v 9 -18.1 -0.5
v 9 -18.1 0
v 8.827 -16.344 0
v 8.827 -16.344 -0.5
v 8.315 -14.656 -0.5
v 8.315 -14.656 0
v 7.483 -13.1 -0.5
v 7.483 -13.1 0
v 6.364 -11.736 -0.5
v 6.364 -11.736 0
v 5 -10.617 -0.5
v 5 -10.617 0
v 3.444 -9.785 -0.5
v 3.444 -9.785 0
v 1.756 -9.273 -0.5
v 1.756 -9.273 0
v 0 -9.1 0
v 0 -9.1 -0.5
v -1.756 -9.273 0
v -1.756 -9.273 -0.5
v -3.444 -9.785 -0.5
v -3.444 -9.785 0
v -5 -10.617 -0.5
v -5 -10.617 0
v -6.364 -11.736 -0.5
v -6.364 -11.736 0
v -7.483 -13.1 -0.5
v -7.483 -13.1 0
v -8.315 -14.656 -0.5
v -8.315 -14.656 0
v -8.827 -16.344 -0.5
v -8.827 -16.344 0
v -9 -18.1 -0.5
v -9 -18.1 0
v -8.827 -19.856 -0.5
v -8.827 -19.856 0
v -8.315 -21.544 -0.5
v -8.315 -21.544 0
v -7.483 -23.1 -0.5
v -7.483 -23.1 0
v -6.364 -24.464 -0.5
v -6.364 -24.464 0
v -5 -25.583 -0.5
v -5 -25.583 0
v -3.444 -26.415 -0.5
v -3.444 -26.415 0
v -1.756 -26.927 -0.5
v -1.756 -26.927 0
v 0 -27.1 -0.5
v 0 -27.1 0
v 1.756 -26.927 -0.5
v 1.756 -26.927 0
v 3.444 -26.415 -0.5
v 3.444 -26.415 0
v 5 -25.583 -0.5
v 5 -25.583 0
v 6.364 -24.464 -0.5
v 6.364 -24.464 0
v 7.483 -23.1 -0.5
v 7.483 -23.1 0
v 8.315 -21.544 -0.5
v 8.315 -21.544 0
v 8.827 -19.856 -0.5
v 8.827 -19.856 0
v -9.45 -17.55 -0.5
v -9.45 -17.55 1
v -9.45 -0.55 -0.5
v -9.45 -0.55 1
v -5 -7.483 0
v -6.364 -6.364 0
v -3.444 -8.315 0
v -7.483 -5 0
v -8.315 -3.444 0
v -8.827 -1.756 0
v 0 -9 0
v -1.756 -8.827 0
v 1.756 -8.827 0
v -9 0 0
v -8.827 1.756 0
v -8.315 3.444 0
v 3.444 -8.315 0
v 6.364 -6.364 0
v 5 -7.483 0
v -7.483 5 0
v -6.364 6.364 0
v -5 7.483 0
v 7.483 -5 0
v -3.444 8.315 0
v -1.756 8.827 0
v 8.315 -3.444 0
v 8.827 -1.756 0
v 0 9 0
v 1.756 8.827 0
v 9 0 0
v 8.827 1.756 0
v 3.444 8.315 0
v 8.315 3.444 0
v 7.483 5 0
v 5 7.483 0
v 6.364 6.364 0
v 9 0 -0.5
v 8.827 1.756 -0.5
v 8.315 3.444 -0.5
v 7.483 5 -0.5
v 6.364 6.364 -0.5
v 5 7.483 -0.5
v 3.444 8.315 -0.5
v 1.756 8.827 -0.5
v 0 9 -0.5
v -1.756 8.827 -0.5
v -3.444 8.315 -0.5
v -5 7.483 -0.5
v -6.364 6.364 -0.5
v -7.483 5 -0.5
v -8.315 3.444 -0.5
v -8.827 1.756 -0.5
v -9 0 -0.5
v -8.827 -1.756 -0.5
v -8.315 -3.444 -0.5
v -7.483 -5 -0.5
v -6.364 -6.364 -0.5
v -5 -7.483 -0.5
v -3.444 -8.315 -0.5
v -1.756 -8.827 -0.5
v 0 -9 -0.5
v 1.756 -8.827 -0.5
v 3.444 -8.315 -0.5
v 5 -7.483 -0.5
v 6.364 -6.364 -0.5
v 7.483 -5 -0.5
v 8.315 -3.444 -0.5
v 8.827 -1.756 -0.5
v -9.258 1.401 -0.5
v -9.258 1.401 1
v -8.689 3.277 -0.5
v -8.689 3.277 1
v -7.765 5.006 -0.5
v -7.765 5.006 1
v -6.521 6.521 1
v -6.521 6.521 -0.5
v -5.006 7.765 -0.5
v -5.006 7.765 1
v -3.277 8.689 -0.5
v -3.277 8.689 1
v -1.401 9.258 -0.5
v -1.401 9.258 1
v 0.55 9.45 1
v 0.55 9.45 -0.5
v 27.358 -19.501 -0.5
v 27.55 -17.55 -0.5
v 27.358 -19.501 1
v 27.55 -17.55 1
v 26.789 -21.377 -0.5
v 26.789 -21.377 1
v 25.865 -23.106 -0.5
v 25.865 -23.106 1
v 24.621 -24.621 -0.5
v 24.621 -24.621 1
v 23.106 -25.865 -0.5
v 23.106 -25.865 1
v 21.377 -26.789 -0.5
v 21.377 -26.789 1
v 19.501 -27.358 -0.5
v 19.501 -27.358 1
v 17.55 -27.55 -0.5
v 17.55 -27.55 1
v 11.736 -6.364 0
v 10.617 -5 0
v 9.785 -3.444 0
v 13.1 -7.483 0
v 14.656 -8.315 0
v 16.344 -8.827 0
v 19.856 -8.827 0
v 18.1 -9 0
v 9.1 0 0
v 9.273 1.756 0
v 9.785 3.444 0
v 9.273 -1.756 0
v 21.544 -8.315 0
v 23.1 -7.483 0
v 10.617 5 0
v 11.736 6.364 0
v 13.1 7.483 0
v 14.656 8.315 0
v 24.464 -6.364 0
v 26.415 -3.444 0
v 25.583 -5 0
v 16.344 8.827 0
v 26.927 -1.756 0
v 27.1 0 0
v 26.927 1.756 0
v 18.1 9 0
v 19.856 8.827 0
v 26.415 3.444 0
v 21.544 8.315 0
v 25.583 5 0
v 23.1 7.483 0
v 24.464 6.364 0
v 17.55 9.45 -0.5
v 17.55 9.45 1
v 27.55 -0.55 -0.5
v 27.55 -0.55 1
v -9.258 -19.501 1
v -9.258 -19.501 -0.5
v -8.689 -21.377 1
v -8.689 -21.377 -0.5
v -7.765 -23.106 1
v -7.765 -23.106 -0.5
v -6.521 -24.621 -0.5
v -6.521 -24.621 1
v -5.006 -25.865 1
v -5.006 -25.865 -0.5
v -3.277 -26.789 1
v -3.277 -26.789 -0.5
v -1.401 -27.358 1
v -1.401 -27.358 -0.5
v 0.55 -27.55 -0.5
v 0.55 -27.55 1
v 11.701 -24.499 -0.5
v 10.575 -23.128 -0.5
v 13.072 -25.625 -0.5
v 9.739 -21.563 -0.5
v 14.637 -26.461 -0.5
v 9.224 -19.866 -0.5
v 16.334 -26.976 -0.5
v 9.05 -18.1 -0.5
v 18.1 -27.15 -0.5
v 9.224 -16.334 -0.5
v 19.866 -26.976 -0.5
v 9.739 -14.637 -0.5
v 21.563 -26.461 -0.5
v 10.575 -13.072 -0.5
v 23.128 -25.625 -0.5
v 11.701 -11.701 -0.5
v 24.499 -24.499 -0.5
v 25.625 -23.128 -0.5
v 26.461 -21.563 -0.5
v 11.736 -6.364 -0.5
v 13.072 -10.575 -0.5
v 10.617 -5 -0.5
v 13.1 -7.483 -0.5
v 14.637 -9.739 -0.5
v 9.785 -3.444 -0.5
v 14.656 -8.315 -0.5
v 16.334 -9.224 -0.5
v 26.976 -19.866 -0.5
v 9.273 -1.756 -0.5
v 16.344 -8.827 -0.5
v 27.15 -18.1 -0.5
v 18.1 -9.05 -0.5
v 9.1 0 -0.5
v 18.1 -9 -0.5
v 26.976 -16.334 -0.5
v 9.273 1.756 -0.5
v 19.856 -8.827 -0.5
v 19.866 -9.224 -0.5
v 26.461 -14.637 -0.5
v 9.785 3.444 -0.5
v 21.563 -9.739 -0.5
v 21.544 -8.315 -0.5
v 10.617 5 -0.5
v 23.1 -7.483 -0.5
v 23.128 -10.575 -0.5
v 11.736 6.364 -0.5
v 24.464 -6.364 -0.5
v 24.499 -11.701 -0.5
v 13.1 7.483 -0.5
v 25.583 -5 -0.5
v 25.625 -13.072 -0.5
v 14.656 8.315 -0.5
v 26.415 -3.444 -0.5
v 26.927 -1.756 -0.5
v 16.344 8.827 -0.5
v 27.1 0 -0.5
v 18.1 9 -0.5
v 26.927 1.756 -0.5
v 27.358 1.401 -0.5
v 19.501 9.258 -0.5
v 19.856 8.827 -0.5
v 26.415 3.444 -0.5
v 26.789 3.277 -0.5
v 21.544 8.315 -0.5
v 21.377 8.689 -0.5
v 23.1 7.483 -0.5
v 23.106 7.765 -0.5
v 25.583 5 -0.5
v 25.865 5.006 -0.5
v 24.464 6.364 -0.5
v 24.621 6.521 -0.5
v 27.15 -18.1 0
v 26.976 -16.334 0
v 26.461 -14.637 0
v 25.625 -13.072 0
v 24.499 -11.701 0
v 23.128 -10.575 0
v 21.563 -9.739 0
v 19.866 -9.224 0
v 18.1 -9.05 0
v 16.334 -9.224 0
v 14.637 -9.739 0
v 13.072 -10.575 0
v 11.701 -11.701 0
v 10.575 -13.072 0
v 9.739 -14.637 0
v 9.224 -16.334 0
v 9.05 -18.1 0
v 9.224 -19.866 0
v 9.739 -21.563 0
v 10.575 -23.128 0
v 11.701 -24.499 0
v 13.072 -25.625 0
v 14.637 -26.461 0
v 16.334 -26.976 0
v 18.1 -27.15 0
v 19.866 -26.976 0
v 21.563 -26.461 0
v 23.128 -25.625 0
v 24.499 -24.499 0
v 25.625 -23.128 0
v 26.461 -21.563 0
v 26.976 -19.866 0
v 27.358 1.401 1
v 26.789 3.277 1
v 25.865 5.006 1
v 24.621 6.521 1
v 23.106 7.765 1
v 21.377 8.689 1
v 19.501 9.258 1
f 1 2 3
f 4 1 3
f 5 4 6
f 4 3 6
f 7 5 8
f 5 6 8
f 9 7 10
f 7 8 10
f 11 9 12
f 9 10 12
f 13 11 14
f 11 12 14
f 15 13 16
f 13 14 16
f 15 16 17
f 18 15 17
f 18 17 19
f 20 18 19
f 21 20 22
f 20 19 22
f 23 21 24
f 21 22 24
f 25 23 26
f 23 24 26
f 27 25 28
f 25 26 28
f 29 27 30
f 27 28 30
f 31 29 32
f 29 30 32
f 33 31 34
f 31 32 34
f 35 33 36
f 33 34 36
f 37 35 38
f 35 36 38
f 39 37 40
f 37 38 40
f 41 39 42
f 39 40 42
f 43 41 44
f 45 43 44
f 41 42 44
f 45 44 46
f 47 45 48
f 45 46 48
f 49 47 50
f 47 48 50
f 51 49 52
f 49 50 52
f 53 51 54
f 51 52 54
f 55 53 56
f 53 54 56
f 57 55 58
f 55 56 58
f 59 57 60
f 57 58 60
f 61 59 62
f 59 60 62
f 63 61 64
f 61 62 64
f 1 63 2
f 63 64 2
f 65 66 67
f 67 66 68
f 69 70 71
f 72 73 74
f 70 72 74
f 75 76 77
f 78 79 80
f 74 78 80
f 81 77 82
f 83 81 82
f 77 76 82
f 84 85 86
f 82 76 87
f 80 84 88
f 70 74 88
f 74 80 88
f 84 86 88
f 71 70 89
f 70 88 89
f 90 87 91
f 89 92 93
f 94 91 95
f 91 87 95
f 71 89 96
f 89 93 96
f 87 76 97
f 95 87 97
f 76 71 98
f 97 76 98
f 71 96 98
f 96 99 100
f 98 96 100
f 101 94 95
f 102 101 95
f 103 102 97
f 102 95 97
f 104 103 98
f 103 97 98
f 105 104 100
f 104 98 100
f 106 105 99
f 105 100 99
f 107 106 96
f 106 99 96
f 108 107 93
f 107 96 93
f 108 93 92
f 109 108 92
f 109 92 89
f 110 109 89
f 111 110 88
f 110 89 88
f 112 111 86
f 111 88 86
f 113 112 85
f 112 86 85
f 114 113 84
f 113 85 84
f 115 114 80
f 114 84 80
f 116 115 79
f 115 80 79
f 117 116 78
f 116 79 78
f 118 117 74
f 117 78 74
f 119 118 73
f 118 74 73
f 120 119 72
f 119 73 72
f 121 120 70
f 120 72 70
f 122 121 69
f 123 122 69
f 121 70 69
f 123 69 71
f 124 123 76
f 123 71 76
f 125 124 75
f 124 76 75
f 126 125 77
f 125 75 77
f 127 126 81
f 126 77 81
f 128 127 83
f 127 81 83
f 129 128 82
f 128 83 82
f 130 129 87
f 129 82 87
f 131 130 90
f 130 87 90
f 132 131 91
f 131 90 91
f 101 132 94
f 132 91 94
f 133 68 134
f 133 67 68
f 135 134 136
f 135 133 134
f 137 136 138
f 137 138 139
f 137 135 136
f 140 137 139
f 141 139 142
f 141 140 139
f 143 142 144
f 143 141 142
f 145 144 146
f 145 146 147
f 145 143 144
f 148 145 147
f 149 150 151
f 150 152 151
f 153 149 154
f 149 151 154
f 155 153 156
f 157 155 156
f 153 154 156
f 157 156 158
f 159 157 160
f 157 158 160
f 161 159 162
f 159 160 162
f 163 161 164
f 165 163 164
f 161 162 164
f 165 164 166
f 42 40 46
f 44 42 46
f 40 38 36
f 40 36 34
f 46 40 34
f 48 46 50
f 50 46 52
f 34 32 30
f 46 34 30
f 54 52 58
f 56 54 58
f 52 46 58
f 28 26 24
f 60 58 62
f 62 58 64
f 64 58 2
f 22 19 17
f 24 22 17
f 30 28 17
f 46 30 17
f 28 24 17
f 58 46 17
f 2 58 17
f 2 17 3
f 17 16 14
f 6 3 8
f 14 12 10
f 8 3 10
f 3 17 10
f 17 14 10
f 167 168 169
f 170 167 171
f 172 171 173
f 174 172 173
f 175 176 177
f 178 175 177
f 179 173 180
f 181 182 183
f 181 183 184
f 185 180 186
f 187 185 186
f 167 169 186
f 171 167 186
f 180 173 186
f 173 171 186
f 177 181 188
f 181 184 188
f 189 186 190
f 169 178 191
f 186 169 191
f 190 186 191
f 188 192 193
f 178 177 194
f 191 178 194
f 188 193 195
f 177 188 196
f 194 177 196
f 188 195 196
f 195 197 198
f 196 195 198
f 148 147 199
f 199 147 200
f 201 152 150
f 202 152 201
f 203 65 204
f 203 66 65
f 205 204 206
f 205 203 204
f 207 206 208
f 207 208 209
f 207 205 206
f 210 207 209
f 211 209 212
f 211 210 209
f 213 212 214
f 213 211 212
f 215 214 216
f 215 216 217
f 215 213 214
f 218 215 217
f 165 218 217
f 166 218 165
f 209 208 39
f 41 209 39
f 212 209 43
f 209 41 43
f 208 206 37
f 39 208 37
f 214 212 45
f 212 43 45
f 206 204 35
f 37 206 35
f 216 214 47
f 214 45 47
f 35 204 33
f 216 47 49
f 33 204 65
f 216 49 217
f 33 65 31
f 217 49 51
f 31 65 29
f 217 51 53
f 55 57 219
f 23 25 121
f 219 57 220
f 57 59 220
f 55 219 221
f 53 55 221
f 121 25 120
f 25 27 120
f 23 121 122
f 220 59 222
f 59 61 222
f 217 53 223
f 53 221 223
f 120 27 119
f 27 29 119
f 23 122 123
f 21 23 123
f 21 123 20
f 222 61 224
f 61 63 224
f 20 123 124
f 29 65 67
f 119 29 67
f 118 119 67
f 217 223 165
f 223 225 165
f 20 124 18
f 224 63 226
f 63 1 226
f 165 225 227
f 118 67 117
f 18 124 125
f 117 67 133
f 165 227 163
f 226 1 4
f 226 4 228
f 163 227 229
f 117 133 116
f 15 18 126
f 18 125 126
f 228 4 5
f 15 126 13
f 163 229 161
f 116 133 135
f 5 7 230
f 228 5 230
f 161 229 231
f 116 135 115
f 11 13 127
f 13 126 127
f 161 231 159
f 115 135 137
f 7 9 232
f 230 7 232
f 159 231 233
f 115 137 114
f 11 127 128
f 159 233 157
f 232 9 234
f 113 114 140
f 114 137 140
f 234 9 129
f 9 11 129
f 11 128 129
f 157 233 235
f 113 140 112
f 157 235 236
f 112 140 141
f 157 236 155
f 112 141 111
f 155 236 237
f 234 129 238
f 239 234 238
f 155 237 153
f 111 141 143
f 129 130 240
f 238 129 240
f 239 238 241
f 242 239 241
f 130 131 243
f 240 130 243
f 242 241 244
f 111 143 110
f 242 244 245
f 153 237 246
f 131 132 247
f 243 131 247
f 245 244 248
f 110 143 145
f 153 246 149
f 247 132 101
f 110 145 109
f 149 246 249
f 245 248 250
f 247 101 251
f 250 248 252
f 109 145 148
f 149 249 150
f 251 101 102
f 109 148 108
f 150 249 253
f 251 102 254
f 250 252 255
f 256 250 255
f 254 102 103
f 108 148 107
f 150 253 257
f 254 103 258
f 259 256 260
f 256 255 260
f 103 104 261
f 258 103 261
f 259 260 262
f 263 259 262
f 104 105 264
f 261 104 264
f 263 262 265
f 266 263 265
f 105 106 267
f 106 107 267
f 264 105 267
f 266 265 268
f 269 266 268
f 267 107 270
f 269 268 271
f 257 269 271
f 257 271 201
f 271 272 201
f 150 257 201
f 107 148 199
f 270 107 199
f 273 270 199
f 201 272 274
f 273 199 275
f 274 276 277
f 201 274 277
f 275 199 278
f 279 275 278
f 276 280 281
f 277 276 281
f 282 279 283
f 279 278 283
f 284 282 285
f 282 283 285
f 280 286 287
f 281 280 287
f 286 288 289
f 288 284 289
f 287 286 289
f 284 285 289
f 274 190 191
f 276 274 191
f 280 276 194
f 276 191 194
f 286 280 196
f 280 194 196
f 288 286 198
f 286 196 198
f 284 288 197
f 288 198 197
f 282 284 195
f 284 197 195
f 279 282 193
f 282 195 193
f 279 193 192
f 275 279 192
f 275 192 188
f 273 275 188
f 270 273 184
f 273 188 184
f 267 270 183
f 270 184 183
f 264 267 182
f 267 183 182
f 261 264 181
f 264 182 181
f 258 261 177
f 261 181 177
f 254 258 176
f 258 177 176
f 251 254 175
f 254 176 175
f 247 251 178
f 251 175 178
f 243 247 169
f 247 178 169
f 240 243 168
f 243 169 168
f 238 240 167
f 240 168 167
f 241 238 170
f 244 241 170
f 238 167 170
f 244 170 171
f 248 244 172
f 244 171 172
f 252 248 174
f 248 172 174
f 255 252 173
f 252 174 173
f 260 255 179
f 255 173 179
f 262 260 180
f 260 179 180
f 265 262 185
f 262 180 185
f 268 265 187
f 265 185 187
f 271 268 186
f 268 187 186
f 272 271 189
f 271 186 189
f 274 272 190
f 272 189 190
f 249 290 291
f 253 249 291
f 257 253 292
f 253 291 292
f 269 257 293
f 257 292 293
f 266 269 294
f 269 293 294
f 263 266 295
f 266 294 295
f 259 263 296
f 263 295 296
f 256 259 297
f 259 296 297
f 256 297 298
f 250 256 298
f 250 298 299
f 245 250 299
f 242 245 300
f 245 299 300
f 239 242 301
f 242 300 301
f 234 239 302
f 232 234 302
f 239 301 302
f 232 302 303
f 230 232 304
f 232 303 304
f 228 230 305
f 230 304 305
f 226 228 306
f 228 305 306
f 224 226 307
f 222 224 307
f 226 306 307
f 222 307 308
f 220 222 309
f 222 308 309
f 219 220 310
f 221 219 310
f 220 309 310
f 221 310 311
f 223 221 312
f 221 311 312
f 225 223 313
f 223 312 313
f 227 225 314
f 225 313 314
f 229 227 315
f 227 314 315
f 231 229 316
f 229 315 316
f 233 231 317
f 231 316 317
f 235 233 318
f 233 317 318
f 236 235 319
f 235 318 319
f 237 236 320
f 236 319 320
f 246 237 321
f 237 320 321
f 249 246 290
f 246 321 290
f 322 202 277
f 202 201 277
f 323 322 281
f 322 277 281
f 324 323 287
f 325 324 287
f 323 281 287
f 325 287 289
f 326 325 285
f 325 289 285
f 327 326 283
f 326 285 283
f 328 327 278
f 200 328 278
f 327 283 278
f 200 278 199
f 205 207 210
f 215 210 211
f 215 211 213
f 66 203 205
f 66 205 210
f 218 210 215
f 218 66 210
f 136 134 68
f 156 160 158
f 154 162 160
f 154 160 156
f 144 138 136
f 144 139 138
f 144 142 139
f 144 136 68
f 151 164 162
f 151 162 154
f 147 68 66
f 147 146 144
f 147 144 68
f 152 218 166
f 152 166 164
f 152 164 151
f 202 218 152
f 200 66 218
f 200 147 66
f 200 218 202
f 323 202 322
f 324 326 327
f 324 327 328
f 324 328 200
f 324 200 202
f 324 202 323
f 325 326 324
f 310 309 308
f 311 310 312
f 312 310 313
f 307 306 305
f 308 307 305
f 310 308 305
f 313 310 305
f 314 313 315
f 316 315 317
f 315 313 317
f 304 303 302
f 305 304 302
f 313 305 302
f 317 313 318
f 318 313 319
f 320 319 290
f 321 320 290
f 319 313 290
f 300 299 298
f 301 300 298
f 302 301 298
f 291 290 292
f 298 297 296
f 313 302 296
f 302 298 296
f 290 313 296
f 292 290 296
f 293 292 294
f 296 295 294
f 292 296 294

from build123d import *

# Parameters (mm, degrees)
SKETCH_1_W      = 37
SKETCH_1_H      = 37
EXTRUDE_1_DEPTH = 1
SKETCH_1_6_W    = 37
SKETCH_1_6_H    = 37
SKETCH_1_6_R    = 9.05
SKETCH_1_6_R_2  = 9
EXTRUDE_3_DEPTH = 0.5
FILLET_1_R      = 10


with BuildPart() as part:
    # Эскиз1 → Бобышка-Вытянуть1 (new body)
    with BuildSketch(Plane.XY):
        with Locations((9.05, -9.05)):
            Rectangle(SKETCH_1_W, SKETCH_1_H)
    extrude(amount=EXTRUDE_1_DEPTH)

    # Эскиз1<6> → Бобышка-Вытянуть3 (add)
    with BuildSketch(Plane.XY):
        with Locations((9.05, -9.05)):
            Rectangle(SKETCH_1_6_W, SKETCH_1_6_H)
        with Locations((18.1, -18.1)):
            Circle(SKETCH_1_6_R, mode=Mode.SUBTRACT)
        Circle(SKETCH_1_6_R_2, mode=Mode.SUBTRACT)
        with Locations((18.1, 0)):
            Circle(SKETCH_1_6_R_2, mode=Mode.SUBTRACT)
        with Locations((0, -18.1)):
            Circle(SKETCH_1_6_R_2, mode=Mode.SUBTRACT)
    extrude(amount=-EXTRUDE_3_DEPTH)

    # Скругление1
    fillet_1_edges = [part.edges().sort_by_distance(p)[0] for p in [
        (-9.45, -27.55, 0.25),
        (-9.45, 9.45, 0.25),
        (27.55, 9.45, 0.25),
        (27.55, -27.55, 0.25),
    ]]
    fillet(fillet_1_edges, radius=FILLET_1_R)


solid = part.part
